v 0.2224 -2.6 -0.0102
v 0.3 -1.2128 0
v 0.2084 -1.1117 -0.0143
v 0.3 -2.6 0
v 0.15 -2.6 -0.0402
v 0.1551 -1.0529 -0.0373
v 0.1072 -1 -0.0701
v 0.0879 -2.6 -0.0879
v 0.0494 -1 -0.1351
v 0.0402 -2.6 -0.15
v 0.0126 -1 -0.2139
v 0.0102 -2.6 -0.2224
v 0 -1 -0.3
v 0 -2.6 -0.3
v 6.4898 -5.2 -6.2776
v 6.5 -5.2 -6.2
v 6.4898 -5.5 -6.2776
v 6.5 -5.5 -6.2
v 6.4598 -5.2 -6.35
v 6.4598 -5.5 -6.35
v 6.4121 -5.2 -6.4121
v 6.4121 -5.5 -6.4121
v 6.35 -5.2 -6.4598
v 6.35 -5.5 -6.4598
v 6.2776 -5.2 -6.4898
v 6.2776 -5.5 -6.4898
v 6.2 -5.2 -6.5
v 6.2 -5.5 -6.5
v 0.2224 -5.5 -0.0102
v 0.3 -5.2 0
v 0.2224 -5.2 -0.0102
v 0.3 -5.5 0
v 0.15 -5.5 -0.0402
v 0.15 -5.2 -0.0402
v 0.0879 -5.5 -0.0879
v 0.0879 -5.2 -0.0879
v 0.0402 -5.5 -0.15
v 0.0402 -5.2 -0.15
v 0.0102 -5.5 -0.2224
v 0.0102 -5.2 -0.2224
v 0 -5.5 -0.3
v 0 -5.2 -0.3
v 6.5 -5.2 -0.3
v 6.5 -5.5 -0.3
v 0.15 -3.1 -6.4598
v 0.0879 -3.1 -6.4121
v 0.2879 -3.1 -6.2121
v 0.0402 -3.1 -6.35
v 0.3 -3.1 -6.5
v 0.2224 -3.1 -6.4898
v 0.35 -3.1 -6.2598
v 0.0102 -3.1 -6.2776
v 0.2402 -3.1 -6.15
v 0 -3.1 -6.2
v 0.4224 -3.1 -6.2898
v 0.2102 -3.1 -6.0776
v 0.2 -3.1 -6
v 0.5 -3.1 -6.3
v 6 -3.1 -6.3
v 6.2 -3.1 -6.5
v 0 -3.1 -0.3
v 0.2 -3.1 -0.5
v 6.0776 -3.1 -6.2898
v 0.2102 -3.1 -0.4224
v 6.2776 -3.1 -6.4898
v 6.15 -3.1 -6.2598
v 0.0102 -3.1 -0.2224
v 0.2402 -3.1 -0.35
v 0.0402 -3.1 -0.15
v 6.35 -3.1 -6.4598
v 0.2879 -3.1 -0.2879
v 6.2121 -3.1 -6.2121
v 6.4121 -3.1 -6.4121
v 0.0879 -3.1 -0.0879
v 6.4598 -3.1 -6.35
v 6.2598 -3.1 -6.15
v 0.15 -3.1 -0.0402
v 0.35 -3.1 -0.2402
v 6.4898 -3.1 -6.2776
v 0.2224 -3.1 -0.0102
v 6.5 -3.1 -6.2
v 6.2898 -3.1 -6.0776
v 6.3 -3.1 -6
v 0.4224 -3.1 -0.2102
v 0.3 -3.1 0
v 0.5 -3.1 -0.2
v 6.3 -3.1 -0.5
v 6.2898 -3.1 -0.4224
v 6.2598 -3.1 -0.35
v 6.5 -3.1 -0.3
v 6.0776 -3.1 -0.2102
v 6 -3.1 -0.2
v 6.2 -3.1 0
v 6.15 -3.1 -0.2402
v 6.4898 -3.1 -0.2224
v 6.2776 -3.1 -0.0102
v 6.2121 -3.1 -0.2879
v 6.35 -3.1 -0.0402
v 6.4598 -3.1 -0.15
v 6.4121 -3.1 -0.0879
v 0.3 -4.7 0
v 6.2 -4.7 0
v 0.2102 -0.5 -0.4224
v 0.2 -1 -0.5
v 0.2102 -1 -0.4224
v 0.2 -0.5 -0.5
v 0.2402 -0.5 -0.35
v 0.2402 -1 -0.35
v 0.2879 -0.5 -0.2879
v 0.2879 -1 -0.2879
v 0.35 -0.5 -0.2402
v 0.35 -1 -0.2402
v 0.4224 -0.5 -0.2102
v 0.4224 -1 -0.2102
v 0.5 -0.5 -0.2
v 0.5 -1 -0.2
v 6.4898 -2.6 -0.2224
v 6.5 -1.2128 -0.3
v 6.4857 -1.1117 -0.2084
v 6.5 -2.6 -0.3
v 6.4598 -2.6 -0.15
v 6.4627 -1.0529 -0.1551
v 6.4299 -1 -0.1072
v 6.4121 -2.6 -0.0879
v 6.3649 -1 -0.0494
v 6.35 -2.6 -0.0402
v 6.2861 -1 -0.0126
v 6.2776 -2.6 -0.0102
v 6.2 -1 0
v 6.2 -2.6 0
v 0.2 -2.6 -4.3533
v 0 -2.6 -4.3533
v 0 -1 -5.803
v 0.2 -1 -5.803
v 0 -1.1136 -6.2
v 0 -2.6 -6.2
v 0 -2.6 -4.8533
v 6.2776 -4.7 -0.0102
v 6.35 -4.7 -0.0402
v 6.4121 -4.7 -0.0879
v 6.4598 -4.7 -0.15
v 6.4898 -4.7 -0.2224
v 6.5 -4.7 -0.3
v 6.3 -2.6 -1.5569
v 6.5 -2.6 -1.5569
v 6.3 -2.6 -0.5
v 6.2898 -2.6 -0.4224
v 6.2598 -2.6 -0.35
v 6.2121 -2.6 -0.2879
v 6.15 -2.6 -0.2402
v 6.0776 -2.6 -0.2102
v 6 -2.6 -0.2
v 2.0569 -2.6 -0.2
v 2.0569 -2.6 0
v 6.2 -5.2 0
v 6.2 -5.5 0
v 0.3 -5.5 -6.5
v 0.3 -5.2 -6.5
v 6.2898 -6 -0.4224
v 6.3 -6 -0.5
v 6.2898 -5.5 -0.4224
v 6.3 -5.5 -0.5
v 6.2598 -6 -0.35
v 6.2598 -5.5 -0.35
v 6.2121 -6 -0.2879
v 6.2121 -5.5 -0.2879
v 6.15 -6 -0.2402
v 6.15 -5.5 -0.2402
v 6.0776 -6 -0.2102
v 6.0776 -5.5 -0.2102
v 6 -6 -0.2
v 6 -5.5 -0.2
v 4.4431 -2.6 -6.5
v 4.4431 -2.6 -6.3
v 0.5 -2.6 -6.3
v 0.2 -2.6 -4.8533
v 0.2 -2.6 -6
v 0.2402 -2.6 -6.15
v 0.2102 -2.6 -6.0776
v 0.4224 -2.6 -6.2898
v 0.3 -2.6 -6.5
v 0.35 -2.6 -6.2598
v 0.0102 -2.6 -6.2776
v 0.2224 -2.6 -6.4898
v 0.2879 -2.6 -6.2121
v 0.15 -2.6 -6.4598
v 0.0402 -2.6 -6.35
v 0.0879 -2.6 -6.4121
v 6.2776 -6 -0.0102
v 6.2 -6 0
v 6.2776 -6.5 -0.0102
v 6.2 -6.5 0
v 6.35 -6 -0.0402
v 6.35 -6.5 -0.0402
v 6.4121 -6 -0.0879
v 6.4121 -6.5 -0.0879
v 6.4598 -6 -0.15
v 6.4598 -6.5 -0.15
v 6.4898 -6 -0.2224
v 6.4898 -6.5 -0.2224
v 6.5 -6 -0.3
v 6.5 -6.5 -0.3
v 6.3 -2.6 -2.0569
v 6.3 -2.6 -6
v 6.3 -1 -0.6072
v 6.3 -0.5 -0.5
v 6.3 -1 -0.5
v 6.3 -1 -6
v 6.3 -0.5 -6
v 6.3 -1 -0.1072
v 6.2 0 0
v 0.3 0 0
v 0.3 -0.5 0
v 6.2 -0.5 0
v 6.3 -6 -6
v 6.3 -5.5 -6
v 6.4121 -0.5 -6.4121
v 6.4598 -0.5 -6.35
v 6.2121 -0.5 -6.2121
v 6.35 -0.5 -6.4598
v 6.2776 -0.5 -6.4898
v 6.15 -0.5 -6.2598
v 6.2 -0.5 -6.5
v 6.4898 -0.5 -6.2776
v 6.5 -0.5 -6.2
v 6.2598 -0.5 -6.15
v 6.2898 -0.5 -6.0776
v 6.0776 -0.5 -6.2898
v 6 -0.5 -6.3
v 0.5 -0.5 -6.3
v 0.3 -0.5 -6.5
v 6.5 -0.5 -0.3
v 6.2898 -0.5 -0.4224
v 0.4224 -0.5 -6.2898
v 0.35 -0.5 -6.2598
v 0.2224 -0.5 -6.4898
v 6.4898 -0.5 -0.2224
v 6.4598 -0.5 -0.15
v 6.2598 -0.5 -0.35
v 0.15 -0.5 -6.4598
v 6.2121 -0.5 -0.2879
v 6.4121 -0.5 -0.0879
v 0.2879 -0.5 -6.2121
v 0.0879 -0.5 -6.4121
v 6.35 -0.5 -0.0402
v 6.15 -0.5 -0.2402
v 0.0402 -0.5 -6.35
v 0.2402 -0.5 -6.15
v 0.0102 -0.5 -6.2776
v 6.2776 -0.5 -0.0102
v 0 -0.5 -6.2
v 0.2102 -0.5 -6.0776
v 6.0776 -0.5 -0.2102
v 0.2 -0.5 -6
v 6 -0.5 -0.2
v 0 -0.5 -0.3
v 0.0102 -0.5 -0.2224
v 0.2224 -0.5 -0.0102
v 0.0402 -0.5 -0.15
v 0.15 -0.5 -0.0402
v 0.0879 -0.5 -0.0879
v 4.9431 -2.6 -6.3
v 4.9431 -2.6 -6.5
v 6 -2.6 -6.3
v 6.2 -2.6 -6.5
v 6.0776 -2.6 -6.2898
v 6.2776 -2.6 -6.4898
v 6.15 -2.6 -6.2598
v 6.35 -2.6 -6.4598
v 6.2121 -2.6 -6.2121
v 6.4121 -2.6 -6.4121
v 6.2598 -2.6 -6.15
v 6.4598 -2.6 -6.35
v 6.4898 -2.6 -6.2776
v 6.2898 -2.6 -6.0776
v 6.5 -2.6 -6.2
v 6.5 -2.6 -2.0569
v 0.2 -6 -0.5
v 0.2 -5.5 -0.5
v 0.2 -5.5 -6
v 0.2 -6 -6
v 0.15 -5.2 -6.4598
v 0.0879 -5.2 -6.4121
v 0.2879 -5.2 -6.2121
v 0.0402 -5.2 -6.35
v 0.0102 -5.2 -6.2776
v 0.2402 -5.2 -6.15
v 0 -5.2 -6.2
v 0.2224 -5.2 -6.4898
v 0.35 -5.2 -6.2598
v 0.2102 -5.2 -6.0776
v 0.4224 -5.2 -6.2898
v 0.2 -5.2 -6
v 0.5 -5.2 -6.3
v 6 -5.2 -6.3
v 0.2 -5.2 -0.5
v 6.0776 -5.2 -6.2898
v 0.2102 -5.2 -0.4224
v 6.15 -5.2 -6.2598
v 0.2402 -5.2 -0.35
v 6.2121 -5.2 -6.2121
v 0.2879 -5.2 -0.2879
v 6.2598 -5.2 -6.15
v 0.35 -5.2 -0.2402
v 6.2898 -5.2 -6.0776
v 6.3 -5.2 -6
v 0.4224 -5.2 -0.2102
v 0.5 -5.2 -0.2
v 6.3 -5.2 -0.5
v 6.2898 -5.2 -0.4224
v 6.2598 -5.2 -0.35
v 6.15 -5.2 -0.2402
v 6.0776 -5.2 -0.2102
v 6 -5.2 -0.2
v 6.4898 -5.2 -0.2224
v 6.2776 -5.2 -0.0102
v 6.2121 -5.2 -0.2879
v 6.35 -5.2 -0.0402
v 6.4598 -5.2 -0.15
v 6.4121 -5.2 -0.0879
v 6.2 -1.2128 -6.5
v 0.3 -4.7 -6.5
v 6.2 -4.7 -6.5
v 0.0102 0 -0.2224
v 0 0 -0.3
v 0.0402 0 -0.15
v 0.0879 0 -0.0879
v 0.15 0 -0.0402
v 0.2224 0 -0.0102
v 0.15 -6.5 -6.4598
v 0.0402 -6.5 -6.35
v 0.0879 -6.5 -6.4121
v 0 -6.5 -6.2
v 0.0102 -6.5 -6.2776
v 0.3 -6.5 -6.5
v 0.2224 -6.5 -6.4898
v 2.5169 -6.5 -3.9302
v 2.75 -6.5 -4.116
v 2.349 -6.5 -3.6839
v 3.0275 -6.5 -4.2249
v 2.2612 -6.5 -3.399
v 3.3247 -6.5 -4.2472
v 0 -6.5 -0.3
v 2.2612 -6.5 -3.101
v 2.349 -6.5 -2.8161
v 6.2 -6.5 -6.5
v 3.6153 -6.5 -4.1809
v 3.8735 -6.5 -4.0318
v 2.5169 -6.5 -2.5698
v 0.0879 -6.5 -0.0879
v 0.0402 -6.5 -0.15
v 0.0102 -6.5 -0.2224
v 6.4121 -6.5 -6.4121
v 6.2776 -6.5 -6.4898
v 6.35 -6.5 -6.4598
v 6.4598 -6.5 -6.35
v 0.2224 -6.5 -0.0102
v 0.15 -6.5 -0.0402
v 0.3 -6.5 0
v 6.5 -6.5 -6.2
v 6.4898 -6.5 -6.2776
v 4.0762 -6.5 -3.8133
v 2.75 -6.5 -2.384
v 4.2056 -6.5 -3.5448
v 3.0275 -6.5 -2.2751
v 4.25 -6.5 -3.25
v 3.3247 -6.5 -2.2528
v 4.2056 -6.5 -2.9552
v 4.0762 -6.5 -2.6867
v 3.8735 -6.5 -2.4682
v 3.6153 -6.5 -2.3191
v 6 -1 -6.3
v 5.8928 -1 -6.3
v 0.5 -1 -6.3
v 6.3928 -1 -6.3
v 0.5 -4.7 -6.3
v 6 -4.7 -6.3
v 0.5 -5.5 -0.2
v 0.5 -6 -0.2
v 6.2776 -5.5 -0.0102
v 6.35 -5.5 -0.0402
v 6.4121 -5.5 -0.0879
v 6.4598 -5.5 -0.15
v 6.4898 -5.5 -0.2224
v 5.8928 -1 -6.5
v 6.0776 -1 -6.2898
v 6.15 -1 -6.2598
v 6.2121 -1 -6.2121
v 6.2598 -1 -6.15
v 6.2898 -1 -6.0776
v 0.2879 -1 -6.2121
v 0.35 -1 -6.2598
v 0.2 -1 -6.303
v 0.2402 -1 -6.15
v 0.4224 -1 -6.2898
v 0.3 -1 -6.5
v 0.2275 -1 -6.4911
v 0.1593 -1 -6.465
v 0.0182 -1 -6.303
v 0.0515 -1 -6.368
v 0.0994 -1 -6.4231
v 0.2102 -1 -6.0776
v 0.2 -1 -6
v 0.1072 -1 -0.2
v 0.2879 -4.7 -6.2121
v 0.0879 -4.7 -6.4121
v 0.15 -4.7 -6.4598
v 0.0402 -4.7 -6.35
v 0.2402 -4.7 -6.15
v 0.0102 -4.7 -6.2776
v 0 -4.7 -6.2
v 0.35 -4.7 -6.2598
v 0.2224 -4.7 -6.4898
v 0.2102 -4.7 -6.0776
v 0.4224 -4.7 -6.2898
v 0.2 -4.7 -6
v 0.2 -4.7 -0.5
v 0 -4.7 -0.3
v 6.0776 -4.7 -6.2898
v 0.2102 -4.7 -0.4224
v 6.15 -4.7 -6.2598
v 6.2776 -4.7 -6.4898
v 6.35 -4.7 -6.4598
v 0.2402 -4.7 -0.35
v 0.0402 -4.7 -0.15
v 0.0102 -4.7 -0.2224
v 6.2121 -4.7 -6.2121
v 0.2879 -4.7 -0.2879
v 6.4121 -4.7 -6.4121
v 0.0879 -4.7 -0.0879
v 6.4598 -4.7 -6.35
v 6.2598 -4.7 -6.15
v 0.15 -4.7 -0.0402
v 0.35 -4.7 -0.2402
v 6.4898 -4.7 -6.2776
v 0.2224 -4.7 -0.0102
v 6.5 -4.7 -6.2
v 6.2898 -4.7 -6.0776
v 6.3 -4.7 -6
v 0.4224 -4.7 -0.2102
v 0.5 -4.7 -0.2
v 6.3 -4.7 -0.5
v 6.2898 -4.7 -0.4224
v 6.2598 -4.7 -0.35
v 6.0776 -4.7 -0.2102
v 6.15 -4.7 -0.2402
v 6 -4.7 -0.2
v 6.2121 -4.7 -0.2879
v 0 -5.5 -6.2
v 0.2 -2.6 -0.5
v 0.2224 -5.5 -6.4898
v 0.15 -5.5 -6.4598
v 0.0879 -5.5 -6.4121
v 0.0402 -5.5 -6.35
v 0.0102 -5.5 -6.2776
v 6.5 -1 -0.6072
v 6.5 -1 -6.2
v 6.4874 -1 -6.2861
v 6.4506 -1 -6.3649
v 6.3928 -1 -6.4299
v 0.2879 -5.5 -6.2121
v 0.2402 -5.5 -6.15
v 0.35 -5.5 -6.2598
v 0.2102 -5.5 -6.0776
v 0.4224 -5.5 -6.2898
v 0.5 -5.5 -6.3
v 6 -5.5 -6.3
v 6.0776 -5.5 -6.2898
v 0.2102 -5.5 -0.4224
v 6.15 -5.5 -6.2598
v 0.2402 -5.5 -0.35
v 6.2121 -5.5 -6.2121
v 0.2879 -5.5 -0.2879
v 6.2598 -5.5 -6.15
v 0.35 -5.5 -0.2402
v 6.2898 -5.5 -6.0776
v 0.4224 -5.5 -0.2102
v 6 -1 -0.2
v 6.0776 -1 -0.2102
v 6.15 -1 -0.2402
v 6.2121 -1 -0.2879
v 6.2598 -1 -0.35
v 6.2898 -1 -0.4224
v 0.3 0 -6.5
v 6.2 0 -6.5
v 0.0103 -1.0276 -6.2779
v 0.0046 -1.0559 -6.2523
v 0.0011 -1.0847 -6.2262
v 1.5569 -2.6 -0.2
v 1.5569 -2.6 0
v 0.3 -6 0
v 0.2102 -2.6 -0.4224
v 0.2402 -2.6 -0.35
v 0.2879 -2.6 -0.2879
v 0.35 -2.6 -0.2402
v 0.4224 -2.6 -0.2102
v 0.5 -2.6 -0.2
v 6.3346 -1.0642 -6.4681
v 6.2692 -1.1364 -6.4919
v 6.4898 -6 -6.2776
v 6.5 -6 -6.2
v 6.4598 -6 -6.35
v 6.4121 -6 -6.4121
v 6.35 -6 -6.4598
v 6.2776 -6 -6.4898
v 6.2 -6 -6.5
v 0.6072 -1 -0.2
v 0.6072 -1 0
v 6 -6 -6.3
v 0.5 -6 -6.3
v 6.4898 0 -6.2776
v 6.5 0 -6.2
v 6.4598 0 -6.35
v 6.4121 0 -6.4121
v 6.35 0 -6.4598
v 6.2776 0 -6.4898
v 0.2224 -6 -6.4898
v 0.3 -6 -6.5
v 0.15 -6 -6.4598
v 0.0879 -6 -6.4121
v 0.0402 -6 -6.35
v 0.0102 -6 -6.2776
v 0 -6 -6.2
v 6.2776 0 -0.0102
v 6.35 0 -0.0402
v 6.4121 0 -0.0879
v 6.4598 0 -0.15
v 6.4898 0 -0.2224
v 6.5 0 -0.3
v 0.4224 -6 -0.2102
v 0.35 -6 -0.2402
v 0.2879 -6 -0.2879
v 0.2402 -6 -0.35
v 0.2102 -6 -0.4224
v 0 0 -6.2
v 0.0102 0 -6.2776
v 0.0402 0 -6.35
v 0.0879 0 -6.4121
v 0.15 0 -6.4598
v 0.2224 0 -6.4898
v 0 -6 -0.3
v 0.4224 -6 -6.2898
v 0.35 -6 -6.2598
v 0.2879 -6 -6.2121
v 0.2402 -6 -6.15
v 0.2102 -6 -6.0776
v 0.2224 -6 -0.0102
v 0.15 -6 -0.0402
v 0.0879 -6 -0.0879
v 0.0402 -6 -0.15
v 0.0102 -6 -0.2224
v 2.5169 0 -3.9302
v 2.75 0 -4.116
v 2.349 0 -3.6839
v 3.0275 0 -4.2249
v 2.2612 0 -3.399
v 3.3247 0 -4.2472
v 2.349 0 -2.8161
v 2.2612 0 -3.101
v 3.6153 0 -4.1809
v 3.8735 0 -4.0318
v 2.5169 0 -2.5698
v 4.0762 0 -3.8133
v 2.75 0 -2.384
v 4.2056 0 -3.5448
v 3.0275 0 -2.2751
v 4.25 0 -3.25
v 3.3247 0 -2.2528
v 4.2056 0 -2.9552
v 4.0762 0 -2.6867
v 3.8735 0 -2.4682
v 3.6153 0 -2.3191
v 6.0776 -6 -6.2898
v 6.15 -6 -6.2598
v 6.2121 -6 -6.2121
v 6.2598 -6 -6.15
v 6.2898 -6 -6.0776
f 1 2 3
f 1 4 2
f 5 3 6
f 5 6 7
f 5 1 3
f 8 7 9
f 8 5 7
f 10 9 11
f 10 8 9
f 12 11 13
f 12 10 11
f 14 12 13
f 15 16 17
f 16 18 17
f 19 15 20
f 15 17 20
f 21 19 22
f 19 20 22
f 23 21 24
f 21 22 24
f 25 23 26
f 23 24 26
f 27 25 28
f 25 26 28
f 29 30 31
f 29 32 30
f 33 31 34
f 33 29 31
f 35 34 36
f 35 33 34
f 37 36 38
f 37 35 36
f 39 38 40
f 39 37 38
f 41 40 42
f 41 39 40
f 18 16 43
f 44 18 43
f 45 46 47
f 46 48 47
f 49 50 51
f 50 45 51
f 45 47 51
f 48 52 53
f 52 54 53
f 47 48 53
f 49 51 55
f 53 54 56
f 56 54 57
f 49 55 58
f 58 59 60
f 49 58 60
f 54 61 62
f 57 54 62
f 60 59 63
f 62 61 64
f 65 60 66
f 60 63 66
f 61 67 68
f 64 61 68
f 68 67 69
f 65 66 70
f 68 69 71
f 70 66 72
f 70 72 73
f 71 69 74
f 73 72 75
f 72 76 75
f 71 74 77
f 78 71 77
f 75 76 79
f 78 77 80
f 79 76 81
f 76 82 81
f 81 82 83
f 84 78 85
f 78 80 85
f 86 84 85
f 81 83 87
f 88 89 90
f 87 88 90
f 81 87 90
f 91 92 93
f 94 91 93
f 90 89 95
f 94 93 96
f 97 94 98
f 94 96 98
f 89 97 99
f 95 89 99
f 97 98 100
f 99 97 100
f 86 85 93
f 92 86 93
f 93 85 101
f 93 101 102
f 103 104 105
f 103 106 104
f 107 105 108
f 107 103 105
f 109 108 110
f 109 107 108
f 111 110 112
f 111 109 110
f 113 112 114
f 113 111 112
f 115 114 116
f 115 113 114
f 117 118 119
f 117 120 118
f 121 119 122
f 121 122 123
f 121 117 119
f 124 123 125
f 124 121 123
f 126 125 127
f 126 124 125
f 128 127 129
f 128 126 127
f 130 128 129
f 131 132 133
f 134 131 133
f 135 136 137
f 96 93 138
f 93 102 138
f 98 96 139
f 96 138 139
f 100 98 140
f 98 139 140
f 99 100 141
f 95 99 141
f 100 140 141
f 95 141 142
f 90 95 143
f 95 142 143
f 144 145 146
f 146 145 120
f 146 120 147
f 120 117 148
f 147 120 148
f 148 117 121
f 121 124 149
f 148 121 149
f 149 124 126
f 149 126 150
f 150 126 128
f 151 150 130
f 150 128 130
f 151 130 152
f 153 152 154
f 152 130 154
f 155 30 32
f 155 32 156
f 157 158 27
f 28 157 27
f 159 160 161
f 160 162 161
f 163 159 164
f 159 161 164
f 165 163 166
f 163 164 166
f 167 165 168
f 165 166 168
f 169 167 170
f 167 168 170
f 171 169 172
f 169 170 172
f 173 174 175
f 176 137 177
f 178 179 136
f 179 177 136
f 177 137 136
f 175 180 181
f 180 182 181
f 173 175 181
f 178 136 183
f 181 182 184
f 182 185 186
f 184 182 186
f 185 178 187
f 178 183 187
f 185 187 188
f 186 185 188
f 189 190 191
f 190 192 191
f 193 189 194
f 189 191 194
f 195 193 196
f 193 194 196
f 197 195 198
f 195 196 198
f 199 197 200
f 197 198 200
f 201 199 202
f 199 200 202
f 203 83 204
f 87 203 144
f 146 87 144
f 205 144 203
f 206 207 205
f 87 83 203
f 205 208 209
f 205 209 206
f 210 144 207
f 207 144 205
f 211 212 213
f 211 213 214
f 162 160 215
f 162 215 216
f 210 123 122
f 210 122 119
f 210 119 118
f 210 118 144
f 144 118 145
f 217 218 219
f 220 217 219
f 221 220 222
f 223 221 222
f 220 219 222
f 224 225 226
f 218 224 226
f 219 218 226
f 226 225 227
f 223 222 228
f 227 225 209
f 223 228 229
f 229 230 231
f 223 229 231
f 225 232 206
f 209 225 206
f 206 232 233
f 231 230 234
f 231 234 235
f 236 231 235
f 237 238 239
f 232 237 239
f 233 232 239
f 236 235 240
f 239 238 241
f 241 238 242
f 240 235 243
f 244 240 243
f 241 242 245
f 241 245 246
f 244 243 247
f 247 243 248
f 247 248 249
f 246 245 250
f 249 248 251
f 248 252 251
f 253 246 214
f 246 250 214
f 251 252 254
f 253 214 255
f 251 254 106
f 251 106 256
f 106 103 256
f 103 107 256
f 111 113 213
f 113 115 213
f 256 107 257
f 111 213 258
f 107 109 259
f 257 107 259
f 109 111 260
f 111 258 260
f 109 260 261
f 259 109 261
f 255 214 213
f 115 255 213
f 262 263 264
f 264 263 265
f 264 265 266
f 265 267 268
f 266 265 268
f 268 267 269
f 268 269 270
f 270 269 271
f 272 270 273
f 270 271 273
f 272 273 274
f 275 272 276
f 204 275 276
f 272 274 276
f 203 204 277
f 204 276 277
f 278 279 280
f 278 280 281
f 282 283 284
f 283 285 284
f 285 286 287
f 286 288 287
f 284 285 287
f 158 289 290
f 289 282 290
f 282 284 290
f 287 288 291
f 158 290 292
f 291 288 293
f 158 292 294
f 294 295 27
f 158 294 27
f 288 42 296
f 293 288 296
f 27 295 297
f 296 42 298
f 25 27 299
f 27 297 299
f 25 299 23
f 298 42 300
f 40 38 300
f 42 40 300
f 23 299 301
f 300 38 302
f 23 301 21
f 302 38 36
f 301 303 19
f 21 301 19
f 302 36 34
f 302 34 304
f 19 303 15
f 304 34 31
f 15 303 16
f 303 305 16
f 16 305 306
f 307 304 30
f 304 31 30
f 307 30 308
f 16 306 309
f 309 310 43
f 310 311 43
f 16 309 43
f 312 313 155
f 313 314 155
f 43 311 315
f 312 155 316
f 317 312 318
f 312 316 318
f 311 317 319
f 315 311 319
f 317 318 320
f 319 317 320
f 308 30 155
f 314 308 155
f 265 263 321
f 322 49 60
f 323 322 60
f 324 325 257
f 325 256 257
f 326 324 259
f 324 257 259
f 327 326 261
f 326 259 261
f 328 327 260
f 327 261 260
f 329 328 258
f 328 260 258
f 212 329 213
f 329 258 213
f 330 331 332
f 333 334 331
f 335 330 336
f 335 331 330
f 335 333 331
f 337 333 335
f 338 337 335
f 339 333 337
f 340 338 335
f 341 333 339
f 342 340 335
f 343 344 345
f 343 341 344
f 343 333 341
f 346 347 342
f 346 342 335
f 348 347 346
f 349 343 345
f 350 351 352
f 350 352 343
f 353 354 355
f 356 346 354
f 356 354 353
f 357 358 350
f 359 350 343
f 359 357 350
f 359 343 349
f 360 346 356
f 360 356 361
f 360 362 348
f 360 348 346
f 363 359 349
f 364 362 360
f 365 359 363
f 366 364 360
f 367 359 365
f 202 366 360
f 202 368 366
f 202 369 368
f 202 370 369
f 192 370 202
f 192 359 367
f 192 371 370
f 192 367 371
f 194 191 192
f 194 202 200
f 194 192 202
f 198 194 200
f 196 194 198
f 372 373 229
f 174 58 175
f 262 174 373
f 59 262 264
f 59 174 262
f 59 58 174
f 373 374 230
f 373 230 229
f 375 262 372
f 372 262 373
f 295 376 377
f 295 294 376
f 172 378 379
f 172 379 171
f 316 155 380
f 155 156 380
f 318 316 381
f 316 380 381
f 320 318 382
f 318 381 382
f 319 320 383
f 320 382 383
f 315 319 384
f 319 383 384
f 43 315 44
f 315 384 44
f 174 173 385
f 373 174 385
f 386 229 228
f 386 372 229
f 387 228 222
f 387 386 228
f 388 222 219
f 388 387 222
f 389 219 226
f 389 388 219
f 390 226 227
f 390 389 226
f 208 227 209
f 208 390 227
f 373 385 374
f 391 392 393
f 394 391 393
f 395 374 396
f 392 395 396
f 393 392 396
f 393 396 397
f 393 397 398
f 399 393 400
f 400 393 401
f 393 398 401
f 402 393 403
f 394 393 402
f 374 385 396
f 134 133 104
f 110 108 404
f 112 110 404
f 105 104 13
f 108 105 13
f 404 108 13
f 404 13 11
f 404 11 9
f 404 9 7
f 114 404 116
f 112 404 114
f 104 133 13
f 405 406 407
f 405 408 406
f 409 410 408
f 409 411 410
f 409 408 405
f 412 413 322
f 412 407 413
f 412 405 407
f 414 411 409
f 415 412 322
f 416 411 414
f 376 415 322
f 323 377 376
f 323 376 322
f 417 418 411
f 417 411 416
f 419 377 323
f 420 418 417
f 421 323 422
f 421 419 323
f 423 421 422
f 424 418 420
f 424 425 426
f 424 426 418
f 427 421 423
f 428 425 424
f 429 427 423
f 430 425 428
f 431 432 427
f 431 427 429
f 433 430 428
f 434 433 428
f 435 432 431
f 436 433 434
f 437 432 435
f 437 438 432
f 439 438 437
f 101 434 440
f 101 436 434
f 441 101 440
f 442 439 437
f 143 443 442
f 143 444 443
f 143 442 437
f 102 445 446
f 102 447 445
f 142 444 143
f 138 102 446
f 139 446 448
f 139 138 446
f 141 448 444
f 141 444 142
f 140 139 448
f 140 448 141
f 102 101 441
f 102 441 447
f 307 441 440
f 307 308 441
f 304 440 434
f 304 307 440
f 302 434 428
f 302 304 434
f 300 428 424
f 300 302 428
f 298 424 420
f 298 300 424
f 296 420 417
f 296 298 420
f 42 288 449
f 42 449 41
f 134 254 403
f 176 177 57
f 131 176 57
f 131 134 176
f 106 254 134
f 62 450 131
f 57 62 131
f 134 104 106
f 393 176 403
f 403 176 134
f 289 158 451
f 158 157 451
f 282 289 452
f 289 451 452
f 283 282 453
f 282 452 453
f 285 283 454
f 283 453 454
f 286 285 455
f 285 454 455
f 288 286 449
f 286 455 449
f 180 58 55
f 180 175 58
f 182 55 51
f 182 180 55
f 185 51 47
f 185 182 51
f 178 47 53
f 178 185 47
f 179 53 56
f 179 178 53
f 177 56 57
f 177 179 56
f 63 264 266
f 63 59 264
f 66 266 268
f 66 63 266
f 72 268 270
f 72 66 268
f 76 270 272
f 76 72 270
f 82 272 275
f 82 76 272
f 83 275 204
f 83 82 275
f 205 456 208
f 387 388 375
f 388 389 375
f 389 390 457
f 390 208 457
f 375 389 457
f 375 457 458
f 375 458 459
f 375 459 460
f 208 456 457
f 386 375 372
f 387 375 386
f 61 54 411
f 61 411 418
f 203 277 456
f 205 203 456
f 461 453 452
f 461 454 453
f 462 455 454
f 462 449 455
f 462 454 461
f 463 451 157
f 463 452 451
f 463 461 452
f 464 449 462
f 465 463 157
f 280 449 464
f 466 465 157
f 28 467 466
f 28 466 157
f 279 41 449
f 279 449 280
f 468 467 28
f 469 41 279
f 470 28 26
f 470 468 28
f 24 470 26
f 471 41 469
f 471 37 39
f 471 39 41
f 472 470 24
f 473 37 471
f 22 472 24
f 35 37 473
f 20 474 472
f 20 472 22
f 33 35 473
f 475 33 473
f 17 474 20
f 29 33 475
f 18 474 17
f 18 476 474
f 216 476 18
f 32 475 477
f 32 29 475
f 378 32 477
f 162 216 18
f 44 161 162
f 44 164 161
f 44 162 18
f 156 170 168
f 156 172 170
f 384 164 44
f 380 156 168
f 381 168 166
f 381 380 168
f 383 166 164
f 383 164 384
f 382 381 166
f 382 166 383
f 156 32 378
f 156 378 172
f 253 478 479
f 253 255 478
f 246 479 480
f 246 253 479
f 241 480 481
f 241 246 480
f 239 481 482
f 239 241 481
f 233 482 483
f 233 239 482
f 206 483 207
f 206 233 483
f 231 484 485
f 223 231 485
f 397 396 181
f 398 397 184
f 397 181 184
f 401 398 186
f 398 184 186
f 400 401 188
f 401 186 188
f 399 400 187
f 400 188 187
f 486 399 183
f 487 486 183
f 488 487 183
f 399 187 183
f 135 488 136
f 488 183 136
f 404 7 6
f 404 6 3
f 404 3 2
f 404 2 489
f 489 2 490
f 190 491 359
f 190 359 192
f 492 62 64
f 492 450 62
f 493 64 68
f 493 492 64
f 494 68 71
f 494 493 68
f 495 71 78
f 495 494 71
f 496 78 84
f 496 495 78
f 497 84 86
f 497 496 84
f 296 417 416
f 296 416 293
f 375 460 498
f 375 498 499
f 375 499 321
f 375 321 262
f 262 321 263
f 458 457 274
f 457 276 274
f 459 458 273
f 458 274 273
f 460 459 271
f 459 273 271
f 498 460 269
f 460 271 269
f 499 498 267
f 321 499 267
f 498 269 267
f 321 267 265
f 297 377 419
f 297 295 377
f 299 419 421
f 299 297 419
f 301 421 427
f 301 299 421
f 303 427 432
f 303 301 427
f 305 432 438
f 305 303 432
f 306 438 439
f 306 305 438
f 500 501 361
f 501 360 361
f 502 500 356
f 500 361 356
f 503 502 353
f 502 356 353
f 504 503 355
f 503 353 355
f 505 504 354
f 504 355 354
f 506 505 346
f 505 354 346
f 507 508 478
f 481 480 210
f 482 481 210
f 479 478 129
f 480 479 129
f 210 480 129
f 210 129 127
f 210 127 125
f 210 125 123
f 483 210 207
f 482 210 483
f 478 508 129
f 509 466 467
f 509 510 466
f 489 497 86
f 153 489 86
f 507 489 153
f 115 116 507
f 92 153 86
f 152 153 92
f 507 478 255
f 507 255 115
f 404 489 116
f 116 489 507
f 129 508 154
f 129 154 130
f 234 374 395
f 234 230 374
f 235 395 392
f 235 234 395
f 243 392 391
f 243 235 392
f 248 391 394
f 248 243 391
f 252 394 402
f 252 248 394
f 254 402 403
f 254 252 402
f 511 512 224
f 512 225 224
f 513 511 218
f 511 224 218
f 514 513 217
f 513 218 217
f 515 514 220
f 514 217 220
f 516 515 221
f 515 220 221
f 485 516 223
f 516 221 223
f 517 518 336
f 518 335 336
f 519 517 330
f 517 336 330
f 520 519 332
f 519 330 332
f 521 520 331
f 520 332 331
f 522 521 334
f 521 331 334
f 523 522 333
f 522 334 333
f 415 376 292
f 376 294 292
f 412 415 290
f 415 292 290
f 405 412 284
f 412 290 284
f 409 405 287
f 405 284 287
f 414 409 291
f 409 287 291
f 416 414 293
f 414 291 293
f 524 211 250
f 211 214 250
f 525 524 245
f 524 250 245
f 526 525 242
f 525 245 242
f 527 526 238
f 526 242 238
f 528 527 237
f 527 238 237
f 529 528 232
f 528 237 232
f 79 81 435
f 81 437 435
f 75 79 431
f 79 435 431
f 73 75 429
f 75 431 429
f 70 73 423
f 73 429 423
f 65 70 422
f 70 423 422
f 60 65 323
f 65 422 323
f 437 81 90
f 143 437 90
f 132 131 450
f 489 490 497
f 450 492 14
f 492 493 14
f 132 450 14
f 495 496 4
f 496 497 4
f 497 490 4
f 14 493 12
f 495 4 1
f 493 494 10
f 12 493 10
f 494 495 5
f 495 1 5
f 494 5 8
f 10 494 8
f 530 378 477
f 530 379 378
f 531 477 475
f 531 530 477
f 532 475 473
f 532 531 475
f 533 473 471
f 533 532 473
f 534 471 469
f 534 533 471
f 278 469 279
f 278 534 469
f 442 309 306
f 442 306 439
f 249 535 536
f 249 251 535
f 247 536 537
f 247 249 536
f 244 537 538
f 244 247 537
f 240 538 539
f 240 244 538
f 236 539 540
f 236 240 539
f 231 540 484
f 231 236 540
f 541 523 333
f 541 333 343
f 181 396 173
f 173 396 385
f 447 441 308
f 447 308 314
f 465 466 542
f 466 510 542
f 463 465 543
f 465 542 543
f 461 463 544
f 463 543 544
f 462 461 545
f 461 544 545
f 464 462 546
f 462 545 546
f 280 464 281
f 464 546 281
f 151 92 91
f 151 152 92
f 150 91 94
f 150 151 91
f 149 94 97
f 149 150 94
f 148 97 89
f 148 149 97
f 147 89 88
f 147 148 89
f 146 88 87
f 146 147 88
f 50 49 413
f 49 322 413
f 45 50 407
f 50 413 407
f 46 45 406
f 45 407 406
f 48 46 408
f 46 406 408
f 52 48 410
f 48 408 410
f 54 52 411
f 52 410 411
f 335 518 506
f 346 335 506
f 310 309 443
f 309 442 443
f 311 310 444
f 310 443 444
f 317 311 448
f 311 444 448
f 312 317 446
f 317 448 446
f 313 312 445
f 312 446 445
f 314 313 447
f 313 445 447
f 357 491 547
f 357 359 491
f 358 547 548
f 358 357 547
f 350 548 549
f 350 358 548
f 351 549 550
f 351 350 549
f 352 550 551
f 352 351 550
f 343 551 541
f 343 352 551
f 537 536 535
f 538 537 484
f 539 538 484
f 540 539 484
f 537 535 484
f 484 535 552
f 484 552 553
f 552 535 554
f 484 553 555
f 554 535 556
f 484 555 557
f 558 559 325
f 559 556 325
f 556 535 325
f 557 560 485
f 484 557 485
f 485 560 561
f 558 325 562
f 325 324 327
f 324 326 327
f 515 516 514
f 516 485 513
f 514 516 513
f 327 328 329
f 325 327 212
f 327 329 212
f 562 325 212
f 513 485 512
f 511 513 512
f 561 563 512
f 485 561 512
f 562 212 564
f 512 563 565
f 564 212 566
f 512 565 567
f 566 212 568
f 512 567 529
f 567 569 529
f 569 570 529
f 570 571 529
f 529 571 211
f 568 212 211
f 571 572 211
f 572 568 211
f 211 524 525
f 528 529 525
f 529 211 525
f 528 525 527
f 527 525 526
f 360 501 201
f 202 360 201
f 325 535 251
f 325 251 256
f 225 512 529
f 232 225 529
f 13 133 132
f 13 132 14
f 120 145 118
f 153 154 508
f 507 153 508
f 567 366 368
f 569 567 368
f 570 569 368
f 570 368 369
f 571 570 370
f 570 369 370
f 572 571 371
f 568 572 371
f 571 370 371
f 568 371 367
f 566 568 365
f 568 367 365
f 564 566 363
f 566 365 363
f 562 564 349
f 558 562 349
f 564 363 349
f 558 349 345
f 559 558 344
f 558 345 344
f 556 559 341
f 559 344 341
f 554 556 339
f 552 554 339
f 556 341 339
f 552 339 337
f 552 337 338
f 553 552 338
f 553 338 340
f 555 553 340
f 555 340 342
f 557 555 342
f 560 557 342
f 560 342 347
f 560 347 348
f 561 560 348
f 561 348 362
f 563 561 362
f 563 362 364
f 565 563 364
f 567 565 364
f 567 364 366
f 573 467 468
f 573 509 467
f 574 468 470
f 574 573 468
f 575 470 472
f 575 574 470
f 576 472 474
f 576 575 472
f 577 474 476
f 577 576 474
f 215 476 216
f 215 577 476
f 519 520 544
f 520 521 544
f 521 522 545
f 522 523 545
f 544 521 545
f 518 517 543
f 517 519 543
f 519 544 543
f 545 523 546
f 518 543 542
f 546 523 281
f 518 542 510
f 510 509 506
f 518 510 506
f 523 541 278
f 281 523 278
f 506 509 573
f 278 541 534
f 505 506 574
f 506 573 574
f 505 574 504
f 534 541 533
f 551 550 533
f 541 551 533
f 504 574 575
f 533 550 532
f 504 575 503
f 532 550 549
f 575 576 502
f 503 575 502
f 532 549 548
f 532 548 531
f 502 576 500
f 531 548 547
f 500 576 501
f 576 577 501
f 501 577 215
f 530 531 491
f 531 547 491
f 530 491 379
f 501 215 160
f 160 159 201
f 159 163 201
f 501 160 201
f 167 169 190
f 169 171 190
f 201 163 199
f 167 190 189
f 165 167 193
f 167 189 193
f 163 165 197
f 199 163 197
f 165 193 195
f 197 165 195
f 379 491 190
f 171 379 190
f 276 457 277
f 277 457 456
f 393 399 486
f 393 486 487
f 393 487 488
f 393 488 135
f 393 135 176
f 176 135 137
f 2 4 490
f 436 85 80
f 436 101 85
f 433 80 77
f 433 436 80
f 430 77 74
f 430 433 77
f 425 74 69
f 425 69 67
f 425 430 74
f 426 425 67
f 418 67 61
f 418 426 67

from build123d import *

# Parameters (mm, degrees)
F0_W      = 6.5
F0_H      = 6.5
F1_DEPTH  = 6.5
F2_R      = 1
F3_DEPTH  = 25
F4_W      = 0.5
F4_H      = 6.5
F5_DEPTH  = 0.2
F6_W      = 6.3
F6_H      = 0.5
F7_DEPTH  = 0.2
F8_W      = 0.5
F8_H      = 6.3
F9_DEPTH  = 0.2
F10_W     = 6.1
F10_H     = 0.5
F11_DEPTH = 0.2
F12_R     = 0.3


with BuildPart() as f1:
    # F0 (on Front) → F1 (new body)
    with BuildSketch(Plane.XZ):
        with Locations((3.25, -3.25)):
            Rectangle(F0_W, F0_H)
    extrude(amount=F1_DEPTH)

    # F2 (on face) → F3 (cut)
    with BuildSketch(Plane.XZ.offset(6.5)):
        with Locations((3.25, -3.25)):
            Circle(F2_R)
    extrude(amount=-F3_DEPTH, mode=Mode.SUBTRACT)

    # F4 (on face) → F5 (cut)
    with BuildSketch(Plane.YZ.offset(6.5)):
        with Locations((-5.75, -3.25)):
            Rectangle(F4_W, F4_H)
        with Locations((-4.95, -3.25)):
            Rectangle(F4_W, F4_H)
        Polygon((-3.1, 0), (-3.1, -6.5), (-2.6, -6.5), (-2.6, -2.0569080953), (-1, -0.6072367541), (-1, -6.5), (-0.5, -6.5), (-0.5, 0), (-1, 0), (-1, -0.1072367541), (-2.6, -1.5569080953), (-2.6, 0), align=None)
    extrude(amount=-F5_DEPTH, mode=Mode.SUBTRACT)

    # F6 (on face) → F7 (cut)
    with BuildSketch(Plane.XY):
        with Locations((3.15, -5.75)):
            Rectangle(F6_W, F6_H)
        with Locations((3.15, -4.95)):
            Rectangle(F6_W, F6_H)
        Polygon((0, -2.6), (0, -3.1), (6.3, -3.1), (6.3, -2.6), (2.0569080953, -2.6), (0.6072367541, -1), (6.3, -1), (6.3, -0.5), (0, -0.5), (0, -1), (0.1072367541, -1), (1.5569080953, -2.6), align=None)
    extrude(amount=-F7_DEPTH, mode=Mode.SUBTRACT)

    # F8 (on face) → F9 (cut)
    with BuildSketch(Plane(origin=(0, 0, 0), x_dir=(0, -1, 0), z_dir=(-1, 0, 0))):
        with Locations((5.75, -3.35)):
            Rectangle(F8_W, F8_H)
        with Locations((4.95, -3.35)):
            Rectangle(F8_W, F8_H)
        Polygon((2.6, -6.5), (3.1, -6.5), (3.1, -0.2), (2.6, -0.2), (2.6, -4.3532891255), (1, -5.8029604666), (1, -0.2), (0.5, -0.2), (0.5, -6.5), (1, -6.5), (1, -6.3029604666), (2.6, -4.8532891255), align=None)
    extrude(amount=-F9_DEPTH, mode=Mode.SUBTRACT)

    # F10 (on face) → F11 (cut)
    with BuildSketch(Plane(origin=(0, 0, -6.5), x_dir=(1, 0, 0), z_dir=(0, 0, -1))):
        with Locations((3.25, 5.75)):
            Rectangle(F10_W, F10_H)
        with Locations((3.25, 4.95)):
            Rectangle(F10_W, F10_H)
        Polygon((6.3, 3.1), (0.2, 3.1), (0.2, 2.6), (4.4430919047, 2.6), (5.8927632459, 1), (0.2, 1), (0.2, 0.5), (6.3, 0.5), (6.3, 1), (6.3927632459, 1), (4.9430919047, 2.6), (6.3, 2.6), align=None)
    extrude(amount=-F11_DEPTH, mode=Mode.SUBTRACT)

    # F12
    f12_edges = [f1.edges().sort_by_distance(p)[0] for p in [
        (0, -6.25, -6.5),
        (0.2, -5.75, -6.3),
        (0.2, -4.95, -6.3),
        (0, -5.35, -6.5),
        (0, -3.9, -6.5),
        (0.2, -2.85, -6.3),
        (0, -1.8, -6.5),
        (0.2, -0.75, -6.3),
        (0, -0.25, -6.5),
        (6.5, -0.25, -6.5),
        (6.3, -0.75, -6.3),
        (6.5, -1.8, -6.5),
        (6.3, -4.95, -6.3),
        (6.5, -3.9, -6.5),
        (6.5, -5.35, -6.5),
        (6.3, -5.75, -6.3),
        (6.5, -6.25, -6.5),
        (6.5, -0.25, 0),
        (6.3, -0.75, -0.2),
        (6.5, -1.8, 0),
        (6.3, -2.85, -0.2),
        (6.5, -3.9, 0),
        (6.3, -4.95, -0.2),
        (6.5, -5.35, 0),
        (6.3, -5.75, -0.2),
        (6.5, -6.25, 0),
        (0, -0.25, 0),
        (0.2, -0.75, -0.2),
        (0, -1.8, 0),
        (0.2, -2.85, -0.2),
        (0, -3.9, 0),
        (0.2, -4.95, -0.2),
        (0, -5.35, 0),
        (0.2, -5.75, -0.2),
        (0, -6.25, 0),
        (6.3, -2.85, -6.3),
    ]]
    fillet(f12_edges, radius=F12_R)


solid = f1.part
